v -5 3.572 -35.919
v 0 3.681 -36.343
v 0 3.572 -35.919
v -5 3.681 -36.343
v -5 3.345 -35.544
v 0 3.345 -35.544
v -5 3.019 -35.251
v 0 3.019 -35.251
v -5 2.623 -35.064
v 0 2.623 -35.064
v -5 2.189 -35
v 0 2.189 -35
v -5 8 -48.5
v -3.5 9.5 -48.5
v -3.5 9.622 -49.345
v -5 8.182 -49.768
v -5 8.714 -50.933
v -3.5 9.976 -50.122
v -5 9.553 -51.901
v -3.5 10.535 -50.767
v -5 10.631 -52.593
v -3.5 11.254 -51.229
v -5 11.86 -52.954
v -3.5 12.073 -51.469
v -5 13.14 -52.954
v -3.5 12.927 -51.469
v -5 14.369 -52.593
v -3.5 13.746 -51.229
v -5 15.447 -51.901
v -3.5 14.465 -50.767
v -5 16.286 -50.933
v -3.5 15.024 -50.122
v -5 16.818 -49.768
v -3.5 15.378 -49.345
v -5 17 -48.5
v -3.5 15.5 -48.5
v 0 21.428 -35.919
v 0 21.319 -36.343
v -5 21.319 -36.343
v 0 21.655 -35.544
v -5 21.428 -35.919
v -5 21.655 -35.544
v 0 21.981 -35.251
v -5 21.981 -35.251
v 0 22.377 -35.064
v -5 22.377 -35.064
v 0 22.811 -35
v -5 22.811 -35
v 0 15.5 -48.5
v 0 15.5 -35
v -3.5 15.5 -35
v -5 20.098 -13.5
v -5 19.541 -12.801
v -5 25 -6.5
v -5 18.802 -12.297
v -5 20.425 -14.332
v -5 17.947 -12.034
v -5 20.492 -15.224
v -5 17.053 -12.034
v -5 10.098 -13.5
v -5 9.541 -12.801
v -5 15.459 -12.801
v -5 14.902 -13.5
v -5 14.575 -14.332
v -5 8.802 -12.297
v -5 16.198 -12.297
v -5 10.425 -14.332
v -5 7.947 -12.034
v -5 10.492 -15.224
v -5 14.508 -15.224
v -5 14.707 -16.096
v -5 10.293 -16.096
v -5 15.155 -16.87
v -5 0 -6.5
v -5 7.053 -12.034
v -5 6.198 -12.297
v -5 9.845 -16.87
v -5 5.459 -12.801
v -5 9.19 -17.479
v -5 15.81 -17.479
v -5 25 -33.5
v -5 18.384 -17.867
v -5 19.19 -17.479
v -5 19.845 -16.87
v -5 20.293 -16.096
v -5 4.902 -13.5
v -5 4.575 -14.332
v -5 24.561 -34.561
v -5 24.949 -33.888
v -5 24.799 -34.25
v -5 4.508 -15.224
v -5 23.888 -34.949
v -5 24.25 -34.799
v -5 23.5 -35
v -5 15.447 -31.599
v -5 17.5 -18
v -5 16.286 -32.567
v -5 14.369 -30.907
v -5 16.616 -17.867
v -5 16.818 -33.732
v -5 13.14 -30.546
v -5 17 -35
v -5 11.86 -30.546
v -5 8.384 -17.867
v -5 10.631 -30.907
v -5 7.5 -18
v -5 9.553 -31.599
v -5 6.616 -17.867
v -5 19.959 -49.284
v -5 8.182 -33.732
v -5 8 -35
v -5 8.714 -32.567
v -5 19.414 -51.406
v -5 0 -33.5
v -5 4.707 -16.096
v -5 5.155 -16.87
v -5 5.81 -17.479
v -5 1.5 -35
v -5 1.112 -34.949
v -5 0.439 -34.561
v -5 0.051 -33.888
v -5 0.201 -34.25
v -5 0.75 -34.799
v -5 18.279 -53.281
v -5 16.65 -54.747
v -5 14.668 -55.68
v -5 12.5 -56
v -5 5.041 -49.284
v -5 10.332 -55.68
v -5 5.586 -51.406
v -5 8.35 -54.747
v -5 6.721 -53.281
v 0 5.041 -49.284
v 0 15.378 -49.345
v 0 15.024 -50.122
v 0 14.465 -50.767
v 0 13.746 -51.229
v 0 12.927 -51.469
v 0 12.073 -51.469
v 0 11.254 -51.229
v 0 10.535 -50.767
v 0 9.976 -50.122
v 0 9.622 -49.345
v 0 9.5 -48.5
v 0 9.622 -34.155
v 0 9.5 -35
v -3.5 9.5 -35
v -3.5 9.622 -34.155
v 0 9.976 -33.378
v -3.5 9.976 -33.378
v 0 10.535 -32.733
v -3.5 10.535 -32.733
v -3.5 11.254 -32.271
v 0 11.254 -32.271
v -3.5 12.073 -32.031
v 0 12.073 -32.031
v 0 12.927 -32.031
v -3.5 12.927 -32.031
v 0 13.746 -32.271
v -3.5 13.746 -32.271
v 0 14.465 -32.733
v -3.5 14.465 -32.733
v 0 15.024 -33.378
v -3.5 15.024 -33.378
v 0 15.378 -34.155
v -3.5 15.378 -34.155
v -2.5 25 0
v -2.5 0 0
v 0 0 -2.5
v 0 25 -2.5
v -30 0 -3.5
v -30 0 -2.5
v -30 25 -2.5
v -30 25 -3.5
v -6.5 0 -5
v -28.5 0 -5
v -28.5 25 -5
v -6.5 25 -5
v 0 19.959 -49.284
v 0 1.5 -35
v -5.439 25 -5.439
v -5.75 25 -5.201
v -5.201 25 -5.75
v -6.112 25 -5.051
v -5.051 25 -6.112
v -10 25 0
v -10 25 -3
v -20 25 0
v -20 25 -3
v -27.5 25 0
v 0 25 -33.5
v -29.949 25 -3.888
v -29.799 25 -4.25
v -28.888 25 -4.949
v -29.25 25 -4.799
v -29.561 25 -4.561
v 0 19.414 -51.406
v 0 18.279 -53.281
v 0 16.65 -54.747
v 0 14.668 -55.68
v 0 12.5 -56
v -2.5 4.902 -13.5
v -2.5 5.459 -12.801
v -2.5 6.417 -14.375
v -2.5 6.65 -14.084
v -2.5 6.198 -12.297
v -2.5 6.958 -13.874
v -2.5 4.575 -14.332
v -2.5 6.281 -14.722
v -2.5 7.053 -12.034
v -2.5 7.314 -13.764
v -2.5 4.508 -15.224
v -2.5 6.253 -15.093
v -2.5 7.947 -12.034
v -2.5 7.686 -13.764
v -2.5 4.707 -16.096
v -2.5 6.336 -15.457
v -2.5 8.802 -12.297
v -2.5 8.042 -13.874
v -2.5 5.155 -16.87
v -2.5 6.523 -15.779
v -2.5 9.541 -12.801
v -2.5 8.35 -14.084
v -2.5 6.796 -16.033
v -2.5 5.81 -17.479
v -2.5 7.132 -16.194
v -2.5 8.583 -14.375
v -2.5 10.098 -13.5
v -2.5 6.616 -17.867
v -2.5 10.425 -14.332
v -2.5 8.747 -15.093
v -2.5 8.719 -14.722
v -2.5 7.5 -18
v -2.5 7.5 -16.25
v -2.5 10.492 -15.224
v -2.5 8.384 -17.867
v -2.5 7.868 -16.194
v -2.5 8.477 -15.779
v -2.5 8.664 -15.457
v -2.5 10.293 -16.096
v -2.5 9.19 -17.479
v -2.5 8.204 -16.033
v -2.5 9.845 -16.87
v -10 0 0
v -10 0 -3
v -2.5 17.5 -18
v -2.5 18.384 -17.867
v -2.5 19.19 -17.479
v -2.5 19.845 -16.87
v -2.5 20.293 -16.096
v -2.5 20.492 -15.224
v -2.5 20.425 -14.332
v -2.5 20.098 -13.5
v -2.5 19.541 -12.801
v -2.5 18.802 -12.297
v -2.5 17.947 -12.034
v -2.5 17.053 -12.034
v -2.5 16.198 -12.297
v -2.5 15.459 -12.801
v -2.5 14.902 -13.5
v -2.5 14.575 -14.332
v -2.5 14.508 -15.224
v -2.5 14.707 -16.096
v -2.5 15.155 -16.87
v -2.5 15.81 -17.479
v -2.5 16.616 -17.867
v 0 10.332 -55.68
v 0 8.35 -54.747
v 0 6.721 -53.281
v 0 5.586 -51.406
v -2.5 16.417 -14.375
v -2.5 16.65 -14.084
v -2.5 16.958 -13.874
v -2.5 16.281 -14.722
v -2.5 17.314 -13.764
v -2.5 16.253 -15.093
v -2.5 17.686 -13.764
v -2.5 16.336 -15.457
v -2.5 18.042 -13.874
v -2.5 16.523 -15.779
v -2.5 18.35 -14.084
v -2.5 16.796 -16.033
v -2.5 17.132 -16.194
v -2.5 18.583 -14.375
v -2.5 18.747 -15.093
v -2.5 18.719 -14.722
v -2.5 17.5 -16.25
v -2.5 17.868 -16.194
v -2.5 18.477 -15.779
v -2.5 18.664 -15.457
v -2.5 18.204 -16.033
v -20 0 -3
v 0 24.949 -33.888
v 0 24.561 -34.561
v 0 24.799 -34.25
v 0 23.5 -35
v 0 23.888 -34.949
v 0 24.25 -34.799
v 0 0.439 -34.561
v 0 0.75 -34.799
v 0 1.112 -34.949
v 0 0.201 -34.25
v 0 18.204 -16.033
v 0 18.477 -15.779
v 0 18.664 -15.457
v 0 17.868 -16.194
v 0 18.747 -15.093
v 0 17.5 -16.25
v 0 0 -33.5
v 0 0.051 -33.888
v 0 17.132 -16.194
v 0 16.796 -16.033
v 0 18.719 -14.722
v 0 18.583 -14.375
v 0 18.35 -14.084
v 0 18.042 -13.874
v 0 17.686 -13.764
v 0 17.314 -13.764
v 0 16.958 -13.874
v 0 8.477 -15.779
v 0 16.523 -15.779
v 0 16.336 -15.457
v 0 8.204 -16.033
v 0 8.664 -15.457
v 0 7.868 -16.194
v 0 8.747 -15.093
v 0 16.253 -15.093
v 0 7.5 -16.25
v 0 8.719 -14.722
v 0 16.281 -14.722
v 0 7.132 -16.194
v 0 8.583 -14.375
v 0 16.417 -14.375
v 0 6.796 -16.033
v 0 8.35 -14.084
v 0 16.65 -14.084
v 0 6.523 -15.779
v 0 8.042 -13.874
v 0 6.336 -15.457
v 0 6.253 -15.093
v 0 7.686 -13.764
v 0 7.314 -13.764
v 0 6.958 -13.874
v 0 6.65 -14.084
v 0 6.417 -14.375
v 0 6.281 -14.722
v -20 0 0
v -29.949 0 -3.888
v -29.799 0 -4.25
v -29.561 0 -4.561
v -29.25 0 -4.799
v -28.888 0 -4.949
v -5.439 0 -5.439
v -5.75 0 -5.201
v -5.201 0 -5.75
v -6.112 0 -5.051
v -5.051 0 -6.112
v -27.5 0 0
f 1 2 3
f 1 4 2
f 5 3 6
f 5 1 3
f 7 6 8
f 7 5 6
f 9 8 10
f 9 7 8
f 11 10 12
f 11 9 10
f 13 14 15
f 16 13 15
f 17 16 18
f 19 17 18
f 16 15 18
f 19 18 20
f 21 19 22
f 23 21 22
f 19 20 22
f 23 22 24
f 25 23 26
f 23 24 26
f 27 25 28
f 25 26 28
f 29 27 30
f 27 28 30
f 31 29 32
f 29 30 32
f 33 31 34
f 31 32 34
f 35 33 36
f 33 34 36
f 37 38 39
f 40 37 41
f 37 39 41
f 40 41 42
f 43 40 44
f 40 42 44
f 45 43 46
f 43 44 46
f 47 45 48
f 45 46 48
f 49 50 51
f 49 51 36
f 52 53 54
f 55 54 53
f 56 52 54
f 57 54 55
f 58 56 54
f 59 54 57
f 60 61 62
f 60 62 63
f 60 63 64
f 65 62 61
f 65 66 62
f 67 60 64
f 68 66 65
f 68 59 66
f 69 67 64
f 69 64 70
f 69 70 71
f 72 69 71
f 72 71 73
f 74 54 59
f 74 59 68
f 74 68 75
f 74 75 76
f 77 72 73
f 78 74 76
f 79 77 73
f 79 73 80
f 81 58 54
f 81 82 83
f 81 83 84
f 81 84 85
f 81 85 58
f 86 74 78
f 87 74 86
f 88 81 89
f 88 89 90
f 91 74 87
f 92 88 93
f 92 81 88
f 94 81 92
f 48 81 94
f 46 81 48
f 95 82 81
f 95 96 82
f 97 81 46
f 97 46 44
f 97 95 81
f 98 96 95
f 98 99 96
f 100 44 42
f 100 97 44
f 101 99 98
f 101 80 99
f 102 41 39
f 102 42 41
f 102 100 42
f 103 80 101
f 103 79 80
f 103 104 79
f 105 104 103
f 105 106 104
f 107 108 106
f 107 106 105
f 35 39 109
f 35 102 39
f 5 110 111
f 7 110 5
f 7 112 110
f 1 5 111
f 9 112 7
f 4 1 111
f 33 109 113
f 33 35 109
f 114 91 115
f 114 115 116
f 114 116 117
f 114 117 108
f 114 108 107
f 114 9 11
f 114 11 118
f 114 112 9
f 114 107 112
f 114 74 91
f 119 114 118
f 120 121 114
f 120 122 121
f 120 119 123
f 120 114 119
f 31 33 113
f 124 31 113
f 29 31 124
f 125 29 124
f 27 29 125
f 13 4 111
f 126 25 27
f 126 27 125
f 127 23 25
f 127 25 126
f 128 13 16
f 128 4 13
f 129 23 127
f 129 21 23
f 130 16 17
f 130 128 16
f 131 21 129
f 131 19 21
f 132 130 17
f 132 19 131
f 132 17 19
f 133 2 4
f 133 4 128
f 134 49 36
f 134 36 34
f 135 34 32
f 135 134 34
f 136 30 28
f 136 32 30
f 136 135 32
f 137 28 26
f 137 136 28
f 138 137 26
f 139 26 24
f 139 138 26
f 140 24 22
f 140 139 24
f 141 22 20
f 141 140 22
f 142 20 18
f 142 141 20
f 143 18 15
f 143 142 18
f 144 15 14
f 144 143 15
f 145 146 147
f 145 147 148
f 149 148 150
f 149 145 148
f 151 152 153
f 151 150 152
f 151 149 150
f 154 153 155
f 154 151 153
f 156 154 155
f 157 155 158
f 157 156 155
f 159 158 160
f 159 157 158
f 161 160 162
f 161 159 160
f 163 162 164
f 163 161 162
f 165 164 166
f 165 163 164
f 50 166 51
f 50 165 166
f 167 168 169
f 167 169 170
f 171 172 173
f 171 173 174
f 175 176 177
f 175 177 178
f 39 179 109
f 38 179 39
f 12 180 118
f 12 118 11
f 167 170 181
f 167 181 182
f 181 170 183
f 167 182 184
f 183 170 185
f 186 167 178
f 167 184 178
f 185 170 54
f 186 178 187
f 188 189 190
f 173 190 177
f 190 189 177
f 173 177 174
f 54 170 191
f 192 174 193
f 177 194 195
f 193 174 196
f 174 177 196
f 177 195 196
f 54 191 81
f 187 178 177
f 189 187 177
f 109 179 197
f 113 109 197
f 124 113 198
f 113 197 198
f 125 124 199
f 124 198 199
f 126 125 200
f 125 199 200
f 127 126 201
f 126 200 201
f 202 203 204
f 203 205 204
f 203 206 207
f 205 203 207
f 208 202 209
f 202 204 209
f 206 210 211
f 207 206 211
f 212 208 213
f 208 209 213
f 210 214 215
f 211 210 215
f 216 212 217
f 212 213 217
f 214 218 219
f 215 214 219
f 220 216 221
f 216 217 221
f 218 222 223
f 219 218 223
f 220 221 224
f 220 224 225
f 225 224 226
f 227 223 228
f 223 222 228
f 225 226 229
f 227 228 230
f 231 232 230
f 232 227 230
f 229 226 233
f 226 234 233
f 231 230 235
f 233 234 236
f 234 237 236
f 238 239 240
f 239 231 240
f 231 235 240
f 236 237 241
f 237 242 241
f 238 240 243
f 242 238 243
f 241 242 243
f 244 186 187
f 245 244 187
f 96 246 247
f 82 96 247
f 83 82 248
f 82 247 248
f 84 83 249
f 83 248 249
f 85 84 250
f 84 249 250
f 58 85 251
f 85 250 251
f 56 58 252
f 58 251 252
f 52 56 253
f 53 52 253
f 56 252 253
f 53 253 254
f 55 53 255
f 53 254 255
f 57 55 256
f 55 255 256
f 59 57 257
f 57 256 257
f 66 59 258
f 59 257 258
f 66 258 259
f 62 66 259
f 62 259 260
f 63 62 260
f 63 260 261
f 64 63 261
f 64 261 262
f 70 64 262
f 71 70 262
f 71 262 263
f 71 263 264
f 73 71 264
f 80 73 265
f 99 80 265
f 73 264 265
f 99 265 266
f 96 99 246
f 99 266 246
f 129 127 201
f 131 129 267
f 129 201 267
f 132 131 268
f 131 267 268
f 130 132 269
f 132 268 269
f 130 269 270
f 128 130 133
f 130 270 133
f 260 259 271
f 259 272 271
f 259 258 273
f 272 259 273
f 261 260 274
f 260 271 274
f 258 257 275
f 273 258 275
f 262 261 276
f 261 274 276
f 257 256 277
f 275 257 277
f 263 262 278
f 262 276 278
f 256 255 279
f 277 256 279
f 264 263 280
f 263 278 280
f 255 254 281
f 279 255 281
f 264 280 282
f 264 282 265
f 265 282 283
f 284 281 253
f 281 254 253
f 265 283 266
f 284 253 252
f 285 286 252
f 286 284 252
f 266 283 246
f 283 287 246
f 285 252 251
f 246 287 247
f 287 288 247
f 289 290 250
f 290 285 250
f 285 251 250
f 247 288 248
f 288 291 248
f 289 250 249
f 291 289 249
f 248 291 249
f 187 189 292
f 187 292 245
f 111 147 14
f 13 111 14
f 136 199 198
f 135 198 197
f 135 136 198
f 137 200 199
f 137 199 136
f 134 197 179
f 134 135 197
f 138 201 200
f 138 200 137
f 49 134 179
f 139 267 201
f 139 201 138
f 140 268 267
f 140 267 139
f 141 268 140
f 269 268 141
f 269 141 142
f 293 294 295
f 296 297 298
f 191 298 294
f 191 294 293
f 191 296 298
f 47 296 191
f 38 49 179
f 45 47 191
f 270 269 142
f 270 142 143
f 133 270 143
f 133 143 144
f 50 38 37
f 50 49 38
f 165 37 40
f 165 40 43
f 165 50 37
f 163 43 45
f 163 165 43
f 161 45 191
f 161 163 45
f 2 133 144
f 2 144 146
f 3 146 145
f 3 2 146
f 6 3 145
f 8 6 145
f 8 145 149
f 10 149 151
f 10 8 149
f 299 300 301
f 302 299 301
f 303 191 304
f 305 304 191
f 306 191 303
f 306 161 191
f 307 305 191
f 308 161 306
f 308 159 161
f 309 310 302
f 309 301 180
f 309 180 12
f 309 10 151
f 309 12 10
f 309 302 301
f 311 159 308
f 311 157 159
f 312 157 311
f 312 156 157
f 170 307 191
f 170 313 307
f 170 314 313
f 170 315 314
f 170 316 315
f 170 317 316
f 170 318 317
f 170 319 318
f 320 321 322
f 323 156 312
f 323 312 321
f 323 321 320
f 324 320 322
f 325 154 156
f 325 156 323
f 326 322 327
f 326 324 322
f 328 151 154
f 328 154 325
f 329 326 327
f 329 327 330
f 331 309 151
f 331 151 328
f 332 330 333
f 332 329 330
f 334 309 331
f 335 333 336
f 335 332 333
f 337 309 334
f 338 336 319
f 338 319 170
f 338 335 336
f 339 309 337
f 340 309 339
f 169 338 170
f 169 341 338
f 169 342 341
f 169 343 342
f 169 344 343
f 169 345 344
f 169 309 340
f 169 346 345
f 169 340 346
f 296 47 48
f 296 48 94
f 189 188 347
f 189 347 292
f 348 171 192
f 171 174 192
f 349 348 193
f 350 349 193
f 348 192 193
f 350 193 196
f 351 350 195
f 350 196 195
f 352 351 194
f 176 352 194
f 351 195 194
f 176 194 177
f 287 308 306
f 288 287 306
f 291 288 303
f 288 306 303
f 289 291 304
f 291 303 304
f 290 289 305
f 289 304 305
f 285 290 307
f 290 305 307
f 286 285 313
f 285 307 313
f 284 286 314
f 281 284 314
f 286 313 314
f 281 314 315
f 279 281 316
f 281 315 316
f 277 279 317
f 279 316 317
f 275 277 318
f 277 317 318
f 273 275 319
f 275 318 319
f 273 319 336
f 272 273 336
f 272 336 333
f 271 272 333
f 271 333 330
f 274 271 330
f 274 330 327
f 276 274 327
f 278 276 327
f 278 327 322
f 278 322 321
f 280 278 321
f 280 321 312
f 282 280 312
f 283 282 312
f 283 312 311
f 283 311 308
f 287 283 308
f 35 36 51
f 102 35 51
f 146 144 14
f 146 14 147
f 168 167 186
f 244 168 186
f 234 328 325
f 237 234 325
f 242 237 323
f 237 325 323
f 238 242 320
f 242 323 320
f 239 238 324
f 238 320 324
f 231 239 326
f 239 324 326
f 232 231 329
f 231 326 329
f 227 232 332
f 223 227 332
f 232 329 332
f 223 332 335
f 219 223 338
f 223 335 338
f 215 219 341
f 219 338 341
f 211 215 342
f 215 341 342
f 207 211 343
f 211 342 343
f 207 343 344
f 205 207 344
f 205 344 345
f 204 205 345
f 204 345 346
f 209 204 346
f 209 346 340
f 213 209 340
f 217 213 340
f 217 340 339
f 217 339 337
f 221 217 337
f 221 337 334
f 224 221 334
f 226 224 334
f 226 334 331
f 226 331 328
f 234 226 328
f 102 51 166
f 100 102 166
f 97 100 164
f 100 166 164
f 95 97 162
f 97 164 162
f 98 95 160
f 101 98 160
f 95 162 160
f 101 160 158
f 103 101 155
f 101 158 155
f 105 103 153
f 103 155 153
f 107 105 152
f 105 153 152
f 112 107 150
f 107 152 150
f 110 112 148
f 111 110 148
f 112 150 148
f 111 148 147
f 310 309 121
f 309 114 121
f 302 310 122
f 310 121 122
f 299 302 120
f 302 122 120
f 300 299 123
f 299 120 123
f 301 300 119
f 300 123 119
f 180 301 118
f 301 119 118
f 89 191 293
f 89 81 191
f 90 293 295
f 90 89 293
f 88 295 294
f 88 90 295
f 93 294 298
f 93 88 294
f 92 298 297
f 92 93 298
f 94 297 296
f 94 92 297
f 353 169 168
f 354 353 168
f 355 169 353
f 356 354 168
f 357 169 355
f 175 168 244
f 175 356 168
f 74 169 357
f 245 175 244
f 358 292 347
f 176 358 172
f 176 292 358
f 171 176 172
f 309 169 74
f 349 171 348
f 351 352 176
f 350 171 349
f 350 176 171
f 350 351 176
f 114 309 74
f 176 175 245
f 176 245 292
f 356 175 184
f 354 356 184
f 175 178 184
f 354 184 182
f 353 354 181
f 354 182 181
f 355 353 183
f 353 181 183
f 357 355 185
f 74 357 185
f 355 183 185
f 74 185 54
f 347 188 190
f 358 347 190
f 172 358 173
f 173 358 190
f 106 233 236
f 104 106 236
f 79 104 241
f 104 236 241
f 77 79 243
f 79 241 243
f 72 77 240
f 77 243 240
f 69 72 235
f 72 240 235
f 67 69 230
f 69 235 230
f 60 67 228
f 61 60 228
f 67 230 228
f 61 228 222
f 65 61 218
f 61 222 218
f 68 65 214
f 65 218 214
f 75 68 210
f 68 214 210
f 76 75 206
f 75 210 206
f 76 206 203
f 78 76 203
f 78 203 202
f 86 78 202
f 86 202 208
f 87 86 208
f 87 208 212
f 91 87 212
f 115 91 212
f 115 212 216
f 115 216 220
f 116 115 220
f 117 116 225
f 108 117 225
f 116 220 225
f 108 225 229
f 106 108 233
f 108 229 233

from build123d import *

# Parameters (mm, degrees)
BOSS_EXTRUDE1_DEPTH = 25
CUT_EXTRUDE1_DEPTH  = 25
CUT_EXTRUDE2_DEPTH  = 25
FILLET1_R           = 1.5
SKETCH5_R           = 1.25
CUT_EXTRUDE4_DEPTH  = 25
CUT_EXTRUDE5_START  = -2.5
SKETCH5_4_R         = 3
SKETCH5_4_R_2       = 1.25
CUT_EXTRUDE5_DEPTH  = 2.5
SKETCH7_W           = 10
SKETCH7_H           = 3
CUT_EXTRUDE6_DEPTH  = 69.271516755
CHAMFER1_SIZE       = 2.5
FILLET2_R           = 1.5
CHAMFER2_SIZE       = 1.5


with BuildPart() as part:
    # Sketch1 → Boss-Extrude1 (new body)
    with BuildSketch(Plane(origin=(0, 0, 0), x_dir=(1, 0, 0), z_dir=(0, 1, 0))):
        Polygon((0, 0), (-30, 0), (-30, 5), (-5, 5), (-5, 56), (0, 56), align=None)
    extrude(amount=BOSS_EXTRUDE1_DEPTH)

    # Sketch2 → Cut-Extrude1 (cut)
    with BuildSketch(Plane(origin=(0, 0, 0), x_dir=(0, 0, -1), z_dir=(1, 0, 0))):
        with BuildLine():
            Line((56, 25), (35, 25))
            Line((35, 25), (35, 21.460219273))
            Line((35, 21.460219273), (49.283963462, 19.958914217))
            ThreePointArc((49.283963462, 19.958914217), (54.073586187, 17.518479552), (56, 12.5))
            Line((56, 12.5), (56, 25))
        make_face()
        with BuildLine():
            ThreePointArc((56, 12.5), (54.073586128, 7.481520383), (49.283963288, 5.041085765))
            Line((49.283963288, 5.041085765), (35, 3.539780727))
            Line((35, 3.539780727), (35, 0))
            Line((35, 0), (56, 0))
            Line((56, 0), (56, 12.5))
        make_face()
    extrude(amount=-CUT_EXTRUDE1_DEPTH, mode=Mode.SUBTRACT)

    # Sketch3 → Cut-Extrude2 (cut)
    with BuildSketch(Plane(origin=(0, 0, 0), x_dir=(0, 0, -1), z_dir=(1, 0, 0))):
        with BuildLine():
            Line((35, 15.5), (48.5, 15.5))
            ThreePointArc((48.5, 15.5), (51.5, 12.5), (48.5, 9.5))
            Line((48.5, 9.5), (35, 9.5))
            ThreePointArc((35, 9.5), (32, 12.5), (35, 15.5))
        make_face()
    extrude(amount=-CUT_EXTRUDE2_DEPTH, mode=Mode.SUBTRACT)

    # Fillet1
    fillet1_edges = [part.edges().sort_by_distance(p)[0] for p in [
        (-2.5, 21.460219273, -35),
        (-2.5, 3.539780727, -35),
        (-2.5, 0, -35),
        (-2.5, 25, -35),
    ]]
    fillet(fillet1_edges, radius=FILLET1_R)

    # Sketch5 → Cut-Extrude4 (cut)
    with BuildSketch(Plane(origin=(0, 0, 0), x_dir=(0, 0, -1), z_dir=(1, 0, 0))):
        with Locations((15, 17.5)):
            Circle(SKETCH5_R)
        with Locations((15, 7.5)):
            Circle(SKETCH5_R)
    extrude(amount=-CUT_EXTRUDE4_DEPTH, mode=Mode.SUBTRACT)

    # Sketch5<4> → Cut-Extrude5 (cut)
    # profile 1 of 2: a face of its own
    with BuildSketch(Plane(origin=(0, 0, 0), x_dir=(0, 0, -1), z_dir=(1, 0, 0)).offset(CUT_EXTRUDE5_START)):
        with Locations((15, 17.5)):
            Circle(SKETCH5_4_R)
        with Locations((15, 17.5)):
            Circle(SKETCH5_4_R_2, mode=Mode.SUBTRACT)
    # profile 2 of 2: a face of its own
    with BuildSketch(Plane(origin=(0, 0, 0), x_dir=(0, 0, -1), z_dir=(1, 0, 0)).offset(CUT_EXTRUDE5_START)):
        with Locations((15, 7.5)):
            Circle(SKETCH5_4_R)
        with Locations((15, 7.5)):
            Circle(SKETCH5_4_R_2, mode=Mode.SUBTRACT)
    extrude(amount=-CUT_EXTRUDE5_DEPTH, mode=Mode.SUBTRACT)

    # Sketch7 → Cut-Extrude6 (cut, through all)
    with BuildSketch(Plane(origin=(0, 25, 0), x_dir=(1, 0, 0), z_dir=(0, 1, 0))):
        with Locations((-15, 1.5)):
            Rectangle(SKETCH7_W, SKETCH7_H)
    extrude(amount=-CUT_EXTRUDE6_DEPTH, mode=Mode.SUBTRACT)

    # Chamfer1
    chamfer1_edges = [part.edges().sort_by_distance(p)[0] for p in [
        (0, 12.5, 0),
        (-30, 12.5, 0),
    ]]
    chamfer(chamfer1_edges, length=CHAMFER1_SIZE)

    # Fillet2
    fillet2_edges = [part.edges().sort_by_distance(p)[0] for p in [
        (-30, 12.5, -5),
        (-5, 12.5, -5),
    ]]
    fillet(fillet2_edges, radius=FILLET2_R)

    # Chamfer2
    chamfer2_edges = [part.edges().sort_by_distance(p)[0] for p in [
        (-5, 9.5, -41.75),
        (-5, 12.5, -51.5),
        (-5, 12.5, -32),
        (-5, 15.5, -41.75),
    ]]
    chamfer(chamfer2_edges, length=CHAMFER2_SIZE)


solid = part.part
